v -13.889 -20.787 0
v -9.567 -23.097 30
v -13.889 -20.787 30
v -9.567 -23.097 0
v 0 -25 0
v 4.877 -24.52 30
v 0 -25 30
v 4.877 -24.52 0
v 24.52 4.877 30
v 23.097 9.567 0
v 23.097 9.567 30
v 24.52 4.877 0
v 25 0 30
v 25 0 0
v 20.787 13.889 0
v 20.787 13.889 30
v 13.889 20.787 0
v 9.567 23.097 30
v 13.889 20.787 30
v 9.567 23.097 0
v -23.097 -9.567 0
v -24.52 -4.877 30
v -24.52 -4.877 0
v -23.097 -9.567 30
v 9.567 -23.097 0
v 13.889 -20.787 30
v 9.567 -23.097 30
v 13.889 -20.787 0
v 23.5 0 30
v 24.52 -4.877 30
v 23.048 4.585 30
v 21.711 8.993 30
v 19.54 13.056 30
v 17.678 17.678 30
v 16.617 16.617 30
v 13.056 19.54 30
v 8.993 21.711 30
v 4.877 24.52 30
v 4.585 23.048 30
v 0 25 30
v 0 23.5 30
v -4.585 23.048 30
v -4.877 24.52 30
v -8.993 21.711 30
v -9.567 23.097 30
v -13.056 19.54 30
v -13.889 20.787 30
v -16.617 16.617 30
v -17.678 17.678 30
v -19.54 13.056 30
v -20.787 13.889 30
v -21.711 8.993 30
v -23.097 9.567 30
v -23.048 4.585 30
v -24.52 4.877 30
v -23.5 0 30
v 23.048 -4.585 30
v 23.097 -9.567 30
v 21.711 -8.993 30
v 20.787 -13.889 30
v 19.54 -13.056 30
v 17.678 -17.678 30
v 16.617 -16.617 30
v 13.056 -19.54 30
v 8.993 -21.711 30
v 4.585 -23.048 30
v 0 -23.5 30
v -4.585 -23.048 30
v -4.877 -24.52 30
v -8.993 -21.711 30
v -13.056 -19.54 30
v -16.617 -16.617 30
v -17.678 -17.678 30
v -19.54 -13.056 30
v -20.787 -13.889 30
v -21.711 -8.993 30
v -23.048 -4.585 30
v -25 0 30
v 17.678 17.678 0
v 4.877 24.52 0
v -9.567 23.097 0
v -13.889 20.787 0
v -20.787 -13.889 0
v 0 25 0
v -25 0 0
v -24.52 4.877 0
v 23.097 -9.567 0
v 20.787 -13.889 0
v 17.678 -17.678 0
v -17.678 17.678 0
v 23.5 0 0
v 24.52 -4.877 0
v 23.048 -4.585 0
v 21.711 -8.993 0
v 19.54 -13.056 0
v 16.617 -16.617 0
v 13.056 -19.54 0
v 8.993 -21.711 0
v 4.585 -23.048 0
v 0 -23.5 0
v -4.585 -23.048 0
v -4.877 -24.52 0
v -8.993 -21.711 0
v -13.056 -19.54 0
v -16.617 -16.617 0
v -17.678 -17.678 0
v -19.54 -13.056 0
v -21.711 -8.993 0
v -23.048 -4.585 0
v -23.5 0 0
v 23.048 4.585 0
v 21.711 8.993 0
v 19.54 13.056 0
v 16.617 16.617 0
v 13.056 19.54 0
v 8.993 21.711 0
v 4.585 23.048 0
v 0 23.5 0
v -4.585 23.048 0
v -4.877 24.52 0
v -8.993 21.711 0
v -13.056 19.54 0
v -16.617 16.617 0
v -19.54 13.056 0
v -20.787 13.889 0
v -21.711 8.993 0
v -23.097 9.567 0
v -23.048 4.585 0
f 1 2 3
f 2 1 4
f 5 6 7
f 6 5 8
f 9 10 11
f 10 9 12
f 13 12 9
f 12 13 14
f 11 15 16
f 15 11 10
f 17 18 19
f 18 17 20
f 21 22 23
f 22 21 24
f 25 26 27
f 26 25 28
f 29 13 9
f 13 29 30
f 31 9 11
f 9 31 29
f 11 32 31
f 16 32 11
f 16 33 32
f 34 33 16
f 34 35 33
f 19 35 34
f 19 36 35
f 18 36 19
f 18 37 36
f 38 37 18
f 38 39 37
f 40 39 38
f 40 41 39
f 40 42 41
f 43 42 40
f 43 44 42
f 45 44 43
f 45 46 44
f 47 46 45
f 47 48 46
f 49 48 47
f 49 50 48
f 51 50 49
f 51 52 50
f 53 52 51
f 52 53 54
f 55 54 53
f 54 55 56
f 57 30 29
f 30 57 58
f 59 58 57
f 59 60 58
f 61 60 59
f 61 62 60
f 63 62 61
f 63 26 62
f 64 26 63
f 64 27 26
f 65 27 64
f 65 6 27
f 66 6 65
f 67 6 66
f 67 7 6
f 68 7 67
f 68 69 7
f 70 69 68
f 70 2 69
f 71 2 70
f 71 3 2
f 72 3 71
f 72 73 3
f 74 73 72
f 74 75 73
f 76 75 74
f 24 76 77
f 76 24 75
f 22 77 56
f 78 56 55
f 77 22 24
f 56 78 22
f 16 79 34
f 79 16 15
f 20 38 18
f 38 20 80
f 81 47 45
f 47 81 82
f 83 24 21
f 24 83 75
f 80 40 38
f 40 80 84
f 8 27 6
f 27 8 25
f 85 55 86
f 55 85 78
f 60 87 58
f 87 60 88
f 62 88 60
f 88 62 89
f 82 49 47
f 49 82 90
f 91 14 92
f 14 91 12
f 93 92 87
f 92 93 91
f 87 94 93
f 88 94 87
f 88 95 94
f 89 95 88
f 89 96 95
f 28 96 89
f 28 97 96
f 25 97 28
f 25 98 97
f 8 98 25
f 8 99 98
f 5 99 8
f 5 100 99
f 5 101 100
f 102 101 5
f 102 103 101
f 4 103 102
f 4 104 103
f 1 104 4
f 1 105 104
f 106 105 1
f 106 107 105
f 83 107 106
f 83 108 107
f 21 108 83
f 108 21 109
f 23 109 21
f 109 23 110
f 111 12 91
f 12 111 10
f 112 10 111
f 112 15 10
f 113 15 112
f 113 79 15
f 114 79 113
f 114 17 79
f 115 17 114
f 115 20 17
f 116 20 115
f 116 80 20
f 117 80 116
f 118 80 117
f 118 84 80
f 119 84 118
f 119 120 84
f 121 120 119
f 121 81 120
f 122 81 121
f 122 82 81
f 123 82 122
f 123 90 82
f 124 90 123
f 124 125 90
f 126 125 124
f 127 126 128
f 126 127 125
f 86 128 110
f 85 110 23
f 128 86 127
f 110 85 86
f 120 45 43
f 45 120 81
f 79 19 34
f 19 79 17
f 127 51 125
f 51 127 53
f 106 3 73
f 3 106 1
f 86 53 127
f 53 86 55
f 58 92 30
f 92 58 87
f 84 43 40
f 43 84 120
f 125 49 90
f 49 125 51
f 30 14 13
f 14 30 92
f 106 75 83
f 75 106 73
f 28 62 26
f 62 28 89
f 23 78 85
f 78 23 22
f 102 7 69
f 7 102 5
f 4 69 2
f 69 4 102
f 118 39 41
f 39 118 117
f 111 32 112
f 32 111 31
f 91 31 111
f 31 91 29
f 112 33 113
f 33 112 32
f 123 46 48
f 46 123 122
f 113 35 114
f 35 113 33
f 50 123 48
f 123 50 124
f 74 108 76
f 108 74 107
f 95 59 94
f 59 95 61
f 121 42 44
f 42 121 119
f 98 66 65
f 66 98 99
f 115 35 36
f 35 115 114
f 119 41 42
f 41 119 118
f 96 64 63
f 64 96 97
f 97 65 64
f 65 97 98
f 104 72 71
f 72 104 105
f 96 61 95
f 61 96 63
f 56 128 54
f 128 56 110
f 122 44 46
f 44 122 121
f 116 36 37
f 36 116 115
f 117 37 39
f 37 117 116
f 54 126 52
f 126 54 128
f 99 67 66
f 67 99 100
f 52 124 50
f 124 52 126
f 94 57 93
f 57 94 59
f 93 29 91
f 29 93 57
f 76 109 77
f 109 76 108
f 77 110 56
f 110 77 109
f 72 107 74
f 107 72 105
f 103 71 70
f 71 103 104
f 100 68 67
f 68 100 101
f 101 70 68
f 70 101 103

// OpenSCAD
$fn = 32;

// ----------------------------------------------------------------------
// Thin tube: 1.5 mm wall
// ----------------------------------------------------------------------

// --- parameters (mm) ---
tube_od = 50;             // outer diameter
tube_h = 30;              // height, Z
wall = 1.5;               // wall thickness
fit_tol = 0.1;            // tolerance for press fits, mm
free_tol = 0.3;           // tolerance for clearance fits, mm

difference() {
  cylinder(h = tube_h, d = tube_od);
  translate([0, 0, -1]) cylinder(h = tube_h + 2, d = tube_od - 2 * wall);
}
